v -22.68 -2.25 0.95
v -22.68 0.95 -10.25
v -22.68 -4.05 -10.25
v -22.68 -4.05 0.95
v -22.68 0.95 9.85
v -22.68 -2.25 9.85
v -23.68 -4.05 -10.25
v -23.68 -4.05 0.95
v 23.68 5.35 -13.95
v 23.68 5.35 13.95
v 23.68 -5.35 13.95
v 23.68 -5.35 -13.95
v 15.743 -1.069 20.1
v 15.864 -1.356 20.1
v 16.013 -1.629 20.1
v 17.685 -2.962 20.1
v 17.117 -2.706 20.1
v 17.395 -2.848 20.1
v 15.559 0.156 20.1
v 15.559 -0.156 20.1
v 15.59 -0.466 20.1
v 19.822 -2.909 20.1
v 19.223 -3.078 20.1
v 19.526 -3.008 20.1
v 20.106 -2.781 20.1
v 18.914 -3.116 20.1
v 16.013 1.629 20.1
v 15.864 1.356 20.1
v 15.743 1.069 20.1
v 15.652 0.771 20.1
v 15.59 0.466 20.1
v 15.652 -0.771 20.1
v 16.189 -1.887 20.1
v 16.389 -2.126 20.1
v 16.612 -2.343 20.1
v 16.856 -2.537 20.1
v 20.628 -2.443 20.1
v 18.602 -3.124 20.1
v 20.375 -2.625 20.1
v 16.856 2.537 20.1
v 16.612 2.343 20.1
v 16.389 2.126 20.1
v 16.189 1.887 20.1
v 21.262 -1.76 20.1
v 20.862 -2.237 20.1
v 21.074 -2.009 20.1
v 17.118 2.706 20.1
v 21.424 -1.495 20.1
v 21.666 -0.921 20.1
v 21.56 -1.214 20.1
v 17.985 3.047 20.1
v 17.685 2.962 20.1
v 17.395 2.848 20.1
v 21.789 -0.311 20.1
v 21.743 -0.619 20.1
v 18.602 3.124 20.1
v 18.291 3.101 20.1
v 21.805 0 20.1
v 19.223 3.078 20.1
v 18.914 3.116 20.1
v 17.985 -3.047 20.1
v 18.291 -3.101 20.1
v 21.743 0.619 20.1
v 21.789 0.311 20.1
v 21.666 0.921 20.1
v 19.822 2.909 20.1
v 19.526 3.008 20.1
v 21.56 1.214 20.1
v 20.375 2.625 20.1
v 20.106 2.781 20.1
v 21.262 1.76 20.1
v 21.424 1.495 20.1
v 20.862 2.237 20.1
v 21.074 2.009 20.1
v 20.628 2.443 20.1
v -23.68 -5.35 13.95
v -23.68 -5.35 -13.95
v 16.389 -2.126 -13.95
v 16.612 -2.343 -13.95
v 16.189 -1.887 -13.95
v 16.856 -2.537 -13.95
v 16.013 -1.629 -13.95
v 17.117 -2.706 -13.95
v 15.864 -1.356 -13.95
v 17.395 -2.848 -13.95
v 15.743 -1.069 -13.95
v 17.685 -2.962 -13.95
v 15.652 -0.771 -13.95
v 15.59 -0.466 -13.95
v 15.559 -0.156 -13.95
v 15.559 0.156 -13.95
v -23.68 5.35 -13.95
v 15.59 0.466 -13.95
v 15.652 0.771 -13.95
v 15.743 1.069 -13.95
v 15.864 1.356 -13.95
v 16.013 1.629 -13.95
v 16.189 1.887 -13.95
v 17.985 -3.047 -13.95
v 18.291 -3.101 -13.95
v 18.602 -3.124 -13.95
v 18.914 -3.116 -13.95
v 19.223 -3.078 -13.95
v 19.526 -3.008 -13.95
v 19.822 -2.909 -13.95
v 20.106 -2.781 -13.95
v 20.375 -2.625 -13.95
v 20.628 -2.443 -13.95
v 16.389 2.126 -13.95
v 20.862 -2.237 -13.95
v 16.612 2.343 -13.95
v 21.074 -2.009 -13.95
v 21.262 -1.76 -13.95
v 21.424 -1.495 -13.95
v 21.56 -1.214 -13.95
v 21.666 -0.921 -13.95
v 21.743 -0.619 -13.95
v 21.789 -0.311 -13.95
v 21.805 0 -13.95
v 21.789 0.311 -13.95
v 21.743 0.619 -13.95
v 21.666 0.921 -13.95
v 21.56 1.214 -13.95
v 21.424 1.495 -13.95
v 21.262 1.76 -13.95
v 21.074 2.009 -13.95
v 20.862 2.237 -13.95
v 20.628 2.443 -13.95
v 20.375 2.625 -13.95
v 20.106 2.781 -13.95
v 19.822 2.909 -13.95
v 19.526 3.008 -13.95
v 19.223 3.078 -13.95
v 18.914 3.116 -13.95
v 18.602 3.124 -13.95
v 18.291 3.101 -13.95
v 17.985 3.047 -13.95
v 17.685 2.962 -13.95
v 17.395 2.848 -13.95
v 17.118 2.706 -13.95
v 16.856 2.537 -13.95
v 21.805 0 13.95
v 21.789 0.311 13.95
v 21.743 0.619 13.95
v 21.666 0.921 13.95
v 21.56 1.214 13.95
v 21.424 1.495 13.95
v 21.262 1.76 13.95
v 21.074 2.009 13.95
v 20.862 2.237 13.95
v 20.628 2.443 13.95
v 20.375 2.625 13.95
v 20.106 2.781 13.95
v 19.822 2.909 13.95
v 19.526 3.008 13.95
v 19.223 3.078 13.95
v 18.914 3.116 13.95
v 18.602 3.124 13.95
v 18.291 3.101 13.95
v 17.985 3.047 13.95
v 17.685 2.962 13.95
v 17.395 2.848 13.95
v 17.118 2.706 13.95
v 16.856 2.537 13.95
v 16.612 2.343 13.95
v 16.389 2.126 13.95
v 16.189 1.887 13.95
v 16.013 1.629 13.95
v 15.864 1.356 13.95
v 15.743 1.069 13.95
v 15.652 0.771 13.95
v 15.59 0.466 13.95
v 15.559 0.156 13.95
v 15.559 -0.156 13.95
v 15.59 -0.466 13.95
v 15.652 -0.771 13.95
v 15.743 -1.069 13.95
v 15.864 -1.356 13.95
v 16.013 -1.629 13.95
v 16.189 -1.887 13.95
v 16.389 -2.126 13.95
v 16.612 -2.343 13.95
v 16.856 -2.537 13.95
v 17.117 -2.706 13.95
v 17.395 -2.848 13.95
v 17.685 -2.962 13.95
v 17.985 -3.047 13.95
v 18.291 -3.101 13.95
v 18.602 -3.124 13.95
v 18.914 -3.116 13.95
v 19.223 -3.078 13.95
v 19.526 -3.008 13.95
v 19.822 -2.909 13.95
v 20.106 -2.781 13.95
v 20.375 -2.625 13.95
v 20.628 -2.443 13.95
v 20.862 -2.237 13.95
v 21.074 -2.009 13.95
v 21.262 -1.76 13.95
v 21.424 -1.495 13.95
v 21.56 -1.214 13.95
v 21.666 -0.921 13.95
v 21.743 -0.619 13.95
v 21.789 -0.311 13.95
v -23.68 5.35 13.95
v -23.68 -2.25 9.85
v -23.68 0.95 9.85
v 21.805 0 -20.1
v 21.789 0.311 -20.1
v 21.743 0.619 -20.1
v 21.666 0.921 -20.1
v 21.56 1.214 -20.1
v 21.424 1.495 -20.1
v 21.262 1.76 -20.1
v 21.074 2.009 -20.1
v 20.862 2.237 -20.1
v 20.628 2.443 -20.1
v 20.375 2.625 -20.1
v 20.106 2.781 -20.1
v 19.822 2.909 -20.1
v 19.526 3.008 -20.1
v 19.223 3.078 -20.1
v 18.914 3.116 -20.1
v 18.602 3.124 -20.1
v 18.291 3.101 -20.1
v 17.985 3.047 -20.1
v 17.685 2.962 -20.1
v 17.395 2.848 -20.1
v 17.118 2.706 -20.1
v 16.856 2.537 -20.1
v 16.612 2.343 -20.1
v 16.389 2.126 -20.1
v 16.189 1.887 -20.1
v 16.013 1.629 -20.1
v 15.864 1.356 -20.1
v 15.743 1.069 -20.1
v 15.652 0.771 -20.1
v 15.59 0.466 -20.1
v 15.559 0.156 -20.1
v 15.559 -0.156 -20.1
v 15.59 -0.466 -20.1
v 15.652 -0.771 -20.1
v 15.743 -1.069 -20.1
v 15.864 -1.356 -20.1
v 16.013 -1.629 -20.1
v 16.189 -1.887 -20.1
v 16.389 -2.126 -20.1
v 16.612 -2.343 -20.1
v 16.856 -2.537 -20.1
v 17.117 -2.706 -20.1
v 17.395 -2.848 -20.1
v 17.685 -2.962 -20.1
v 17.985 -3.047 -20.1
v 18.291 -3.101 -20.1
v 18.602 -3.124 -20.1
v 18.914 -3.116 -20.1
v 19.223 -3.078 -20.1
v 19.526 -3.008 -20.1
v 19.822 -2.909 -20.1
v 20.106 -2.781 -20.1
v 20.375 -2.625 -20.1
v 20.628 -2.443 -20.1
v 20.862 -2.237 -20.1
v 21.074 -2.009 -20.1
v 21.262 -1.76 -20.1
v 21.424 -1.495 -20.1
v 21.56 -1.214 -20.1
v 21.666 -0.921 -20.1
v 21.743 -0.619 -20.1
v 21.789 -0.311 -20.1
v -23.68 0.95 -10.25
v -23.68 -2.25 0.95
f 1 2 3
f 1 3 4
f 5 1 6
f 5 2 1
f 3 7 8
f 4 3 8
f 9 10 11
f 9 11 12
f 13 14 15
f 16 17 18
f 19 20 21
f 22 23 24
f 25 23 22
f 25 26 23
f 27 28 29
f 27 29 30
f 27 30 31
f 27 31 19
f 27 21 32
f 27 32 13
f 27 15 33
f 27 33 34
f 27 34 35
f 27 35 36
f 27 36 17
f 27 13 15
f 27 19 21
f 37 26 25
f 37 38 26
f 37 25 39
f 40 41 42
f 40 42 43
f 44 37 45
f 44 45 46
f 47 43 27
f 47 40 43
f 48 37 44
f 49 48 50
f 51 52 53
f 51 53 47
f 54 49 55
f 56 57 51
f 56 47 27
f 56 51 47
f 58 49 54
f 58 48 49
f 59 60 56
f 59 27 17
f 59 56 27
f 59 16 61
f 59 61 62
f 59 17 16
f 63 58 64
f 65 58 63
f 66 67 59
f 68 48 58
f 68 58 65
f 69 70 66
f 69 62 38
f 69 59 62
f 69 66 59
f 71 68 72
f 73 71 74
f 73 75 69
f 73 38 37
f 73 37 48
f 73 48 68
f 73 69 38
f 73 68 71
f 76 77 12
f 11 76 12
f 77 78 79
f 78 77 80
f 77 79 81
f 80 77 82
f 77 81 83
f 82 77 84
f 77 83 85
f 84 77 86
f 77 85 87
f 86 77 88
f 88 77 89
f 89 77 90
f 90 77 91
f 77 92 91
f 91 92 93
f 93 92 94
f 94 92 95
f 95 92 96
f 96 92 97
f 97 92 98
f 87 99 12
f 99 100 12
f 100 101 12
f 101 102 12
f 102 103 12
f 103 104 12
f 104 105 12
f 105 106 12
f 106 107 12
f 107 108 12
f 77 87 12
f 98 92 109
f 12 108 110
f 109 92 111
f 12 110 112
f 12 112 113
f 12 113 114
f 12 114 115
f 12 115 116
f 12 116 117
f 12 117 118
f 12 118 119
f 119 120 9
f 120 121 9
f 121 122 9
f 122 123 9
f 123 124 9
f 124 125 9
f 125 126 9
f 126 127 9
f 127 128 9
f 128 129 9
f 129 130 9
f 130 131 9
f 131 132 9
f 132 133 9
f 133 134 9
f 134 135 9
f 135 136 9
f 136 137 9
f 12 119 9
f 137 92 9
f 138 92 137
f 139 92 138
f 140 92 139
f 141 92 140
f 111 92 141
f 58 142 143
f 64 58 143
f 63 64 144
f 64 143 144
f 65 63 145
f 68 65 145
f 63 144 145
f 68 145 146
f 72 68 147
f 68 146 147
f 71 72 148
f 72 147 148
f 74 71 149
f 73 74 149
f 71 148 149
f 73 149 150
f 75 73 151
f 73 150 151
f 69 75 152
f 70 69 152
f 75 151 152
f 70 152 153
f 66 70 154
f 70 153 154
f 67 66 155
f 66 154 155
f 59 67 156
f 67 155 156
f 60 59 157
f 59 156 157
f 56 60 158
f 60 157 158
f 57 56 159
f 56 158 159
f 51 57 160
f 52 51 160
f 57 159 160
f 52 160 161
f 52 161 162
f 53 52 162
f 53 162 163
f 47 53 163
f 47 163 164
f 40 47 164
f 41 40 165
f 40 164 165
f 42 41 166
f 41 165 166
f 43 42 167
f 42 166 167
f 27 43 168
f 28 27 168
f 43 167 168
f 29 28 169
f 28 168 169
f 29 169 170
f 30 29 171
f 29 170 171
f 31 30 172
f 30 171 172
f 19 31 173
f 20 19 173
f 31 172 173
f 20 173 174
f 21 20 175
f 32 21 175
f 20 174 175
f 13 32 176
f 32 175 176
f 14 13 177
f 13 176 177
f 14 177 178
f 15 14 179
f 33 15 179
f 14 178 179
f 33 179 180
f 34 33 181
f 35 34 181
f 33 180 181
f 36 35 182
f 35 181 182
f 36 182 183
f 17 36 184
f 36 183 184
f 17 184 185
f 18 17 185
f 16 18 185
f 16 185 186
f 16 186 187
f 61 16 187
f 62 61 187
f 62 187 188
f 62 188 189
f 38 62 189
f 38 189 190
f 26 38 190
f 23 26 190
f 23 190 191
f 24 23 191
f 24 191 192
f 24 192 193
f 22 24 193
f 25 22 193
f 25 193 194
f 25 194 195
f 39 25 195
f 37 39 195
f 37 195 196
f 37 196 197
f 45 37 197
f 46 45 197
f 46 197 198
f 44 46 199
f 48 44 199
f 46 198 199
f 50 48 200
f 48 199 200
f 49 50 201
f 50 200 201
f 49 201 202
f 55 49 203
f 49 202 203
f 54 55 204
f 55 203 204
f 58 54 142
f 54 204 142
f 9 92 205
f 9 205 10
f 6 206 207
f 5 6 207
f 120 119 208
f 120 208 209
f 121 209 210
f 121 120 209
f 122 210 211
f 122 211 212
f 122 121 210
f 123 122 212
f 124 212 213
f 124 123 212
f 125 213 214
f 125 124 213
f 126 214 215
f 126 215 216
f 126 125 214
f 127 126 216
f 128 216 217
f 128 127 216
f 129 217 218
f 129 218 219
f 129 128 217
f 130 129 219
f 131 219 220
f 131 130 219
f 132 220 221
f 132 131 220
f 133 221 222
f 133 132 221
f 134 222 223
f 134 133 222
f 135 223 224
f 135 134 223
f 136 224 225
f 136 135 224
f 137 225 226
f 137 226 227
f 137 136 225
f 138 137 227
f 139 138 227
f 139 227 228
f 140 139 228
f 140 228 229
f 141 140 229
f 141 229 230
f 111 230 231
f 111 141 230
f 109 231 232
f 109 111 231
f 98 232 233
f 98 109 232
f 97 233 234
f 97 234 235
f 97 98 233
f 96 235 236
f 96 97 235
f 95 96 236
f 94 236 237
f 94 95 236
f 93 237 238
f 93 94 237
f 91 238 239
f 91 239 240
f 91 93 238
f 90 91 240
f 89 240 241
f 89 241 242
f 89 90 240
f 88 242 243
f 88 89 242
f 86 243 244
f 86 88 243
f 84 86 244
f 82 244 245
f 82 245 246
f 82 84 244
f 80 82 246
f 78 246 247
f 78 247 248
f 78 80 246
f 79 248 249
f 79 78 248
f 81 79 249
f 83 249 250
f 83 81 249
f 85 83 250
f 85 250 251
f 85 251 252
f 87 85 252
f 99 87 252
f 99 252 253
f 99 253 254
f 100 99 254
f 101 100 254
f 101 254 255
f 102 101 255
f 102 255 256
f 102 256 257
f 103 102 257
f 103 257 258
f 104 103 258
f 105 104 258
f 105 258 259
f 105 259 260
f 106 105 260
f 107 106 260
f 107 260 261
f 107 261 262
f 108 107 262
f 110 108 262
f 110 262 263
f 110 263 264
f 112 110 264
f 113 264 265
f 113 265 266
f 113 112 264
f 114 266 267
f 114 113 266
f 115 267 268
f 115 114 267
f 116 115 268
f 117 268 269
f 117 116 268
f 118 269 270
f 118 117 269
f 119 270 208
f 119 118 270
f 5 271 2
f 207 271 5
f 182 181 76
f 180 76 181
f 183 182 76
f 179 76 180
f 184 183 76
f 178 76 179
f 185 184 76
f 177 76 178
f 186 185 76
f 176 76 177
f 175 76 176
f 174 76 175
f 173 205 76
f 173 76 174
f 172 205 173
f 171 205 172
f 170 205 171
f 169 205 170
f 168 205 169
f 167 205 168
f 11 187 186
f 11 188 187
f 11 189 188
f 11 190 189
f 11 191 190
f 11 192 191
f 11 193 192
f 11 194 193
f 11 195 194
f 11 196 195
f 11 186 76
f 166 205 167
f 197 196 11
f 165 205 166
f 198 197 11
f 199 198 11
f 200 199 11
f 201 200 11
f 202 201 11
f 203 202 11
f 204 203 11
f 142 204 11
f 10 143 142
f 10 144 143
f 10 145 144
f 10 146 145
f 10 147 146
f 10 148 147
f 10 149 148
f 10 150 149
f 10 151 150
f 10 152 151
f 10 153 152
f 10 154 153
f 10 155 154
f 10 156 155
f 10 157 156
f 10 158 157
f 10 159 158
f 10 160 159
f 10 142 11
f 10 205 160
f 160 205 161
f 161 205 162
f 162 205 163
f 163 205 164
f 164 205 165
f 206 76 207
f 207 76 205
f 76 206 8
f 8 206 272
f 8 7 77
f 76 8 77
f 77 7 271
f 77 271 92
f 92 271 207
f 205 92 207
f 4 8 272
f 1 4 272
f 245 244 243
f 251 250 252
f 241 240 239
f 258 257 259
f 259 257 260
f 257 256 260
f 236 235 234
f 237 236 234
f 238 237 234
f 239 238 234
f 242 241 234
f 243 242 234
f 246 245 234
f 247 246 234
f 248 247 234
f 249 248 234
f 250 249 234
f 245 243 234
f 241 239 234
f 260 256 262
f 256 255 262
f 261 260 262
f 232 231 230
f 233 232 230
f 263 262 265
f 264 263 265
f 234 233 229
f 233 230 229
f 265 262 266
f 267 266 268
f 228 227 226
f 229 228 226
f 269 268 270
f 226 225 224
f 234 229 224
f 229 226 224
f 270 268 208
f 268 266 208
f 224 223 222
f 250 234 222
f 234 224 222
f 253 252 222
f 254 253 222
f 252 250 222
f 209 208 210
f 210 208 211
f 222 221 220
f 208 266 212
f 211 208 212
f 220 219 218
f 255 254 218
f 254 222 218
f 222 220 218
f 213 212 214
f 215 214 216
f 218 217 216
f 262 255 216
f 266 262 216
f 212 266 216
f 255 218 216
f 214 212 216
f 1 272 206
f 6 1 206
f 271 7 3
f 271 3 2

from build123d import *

# Parameters (mm, degrees)
SKETCH1_W           = 47.36
SKETCH1_H           = 27.9
BOSS_EXTRUDE1_DEPTH = 5.35
SKETCH2_R           = 3.125
BOSS_EXTRUDE2_DEPTH = 6.15
SKETCH3_W           = 11.2
SKETCH3_H           = 5
CUT_EXTRUDE1_DEPTH  = 1
SKETCH5_W           = 8.9
SKETCH5_H           = 3.2
CUT_EXTRUDE2_DEPTH  = 1


with BuildPart() as part:
    # Sketch1 → Boss-Extrude1 (new, symmetric)
    with BuildSketch(Plane(origin=(0, 0, 0), x_dir=(1, 0, 0), z_dir=(0, 1, 0))):
        Rectangle(SKETCH1_W, SKETCH1_H)
    extrude(amount=BOSS_EXTRUDE1_DEPTH, both=True)

    # Sketch2 → Boss-Extrude2 (add)
    with BuildSketch(Plane(origin=(9.73, 0, -13.95), x_dir=(1, 0, 0), z_dir=(0, 0, 1))):
        with Locations((8.95, 0)):
            Circle(SKETCH2_R)
    boss_extrude2 = extrude(amount=-BOSS_EXTRUDE2_DEPTH)

    # Lustro1: Boss-Extrude2 across plane
    add(boss_extrude2.mirror(Plane.XY))

    # Sketch3 → Cut-Extrude1 (cut)
    with BuildSketch(Plane.ZY.offset(23.68)):
        with Locations((-4.65, -1.55)):
            Rectangle(SKETCH3_W, SKETCH3_H)
    extrude(amount=-CUT_EXTRUDE1_DEPTH, mode=Mode.SUBTRACT)

    # Sketch5 → Cut-Extrude2 (cut)
    with BuildSketch(Plane.ZY.offset(23.68)):
        with Locations((5.4, -0.65)):
            Rectangle(SKETCH5_W, SKETCH5_H)
    extrude(amount=-CUT_EXTRUDE2_DEPTH, mode=Mode.SUBTRACT)


solid = part.part
